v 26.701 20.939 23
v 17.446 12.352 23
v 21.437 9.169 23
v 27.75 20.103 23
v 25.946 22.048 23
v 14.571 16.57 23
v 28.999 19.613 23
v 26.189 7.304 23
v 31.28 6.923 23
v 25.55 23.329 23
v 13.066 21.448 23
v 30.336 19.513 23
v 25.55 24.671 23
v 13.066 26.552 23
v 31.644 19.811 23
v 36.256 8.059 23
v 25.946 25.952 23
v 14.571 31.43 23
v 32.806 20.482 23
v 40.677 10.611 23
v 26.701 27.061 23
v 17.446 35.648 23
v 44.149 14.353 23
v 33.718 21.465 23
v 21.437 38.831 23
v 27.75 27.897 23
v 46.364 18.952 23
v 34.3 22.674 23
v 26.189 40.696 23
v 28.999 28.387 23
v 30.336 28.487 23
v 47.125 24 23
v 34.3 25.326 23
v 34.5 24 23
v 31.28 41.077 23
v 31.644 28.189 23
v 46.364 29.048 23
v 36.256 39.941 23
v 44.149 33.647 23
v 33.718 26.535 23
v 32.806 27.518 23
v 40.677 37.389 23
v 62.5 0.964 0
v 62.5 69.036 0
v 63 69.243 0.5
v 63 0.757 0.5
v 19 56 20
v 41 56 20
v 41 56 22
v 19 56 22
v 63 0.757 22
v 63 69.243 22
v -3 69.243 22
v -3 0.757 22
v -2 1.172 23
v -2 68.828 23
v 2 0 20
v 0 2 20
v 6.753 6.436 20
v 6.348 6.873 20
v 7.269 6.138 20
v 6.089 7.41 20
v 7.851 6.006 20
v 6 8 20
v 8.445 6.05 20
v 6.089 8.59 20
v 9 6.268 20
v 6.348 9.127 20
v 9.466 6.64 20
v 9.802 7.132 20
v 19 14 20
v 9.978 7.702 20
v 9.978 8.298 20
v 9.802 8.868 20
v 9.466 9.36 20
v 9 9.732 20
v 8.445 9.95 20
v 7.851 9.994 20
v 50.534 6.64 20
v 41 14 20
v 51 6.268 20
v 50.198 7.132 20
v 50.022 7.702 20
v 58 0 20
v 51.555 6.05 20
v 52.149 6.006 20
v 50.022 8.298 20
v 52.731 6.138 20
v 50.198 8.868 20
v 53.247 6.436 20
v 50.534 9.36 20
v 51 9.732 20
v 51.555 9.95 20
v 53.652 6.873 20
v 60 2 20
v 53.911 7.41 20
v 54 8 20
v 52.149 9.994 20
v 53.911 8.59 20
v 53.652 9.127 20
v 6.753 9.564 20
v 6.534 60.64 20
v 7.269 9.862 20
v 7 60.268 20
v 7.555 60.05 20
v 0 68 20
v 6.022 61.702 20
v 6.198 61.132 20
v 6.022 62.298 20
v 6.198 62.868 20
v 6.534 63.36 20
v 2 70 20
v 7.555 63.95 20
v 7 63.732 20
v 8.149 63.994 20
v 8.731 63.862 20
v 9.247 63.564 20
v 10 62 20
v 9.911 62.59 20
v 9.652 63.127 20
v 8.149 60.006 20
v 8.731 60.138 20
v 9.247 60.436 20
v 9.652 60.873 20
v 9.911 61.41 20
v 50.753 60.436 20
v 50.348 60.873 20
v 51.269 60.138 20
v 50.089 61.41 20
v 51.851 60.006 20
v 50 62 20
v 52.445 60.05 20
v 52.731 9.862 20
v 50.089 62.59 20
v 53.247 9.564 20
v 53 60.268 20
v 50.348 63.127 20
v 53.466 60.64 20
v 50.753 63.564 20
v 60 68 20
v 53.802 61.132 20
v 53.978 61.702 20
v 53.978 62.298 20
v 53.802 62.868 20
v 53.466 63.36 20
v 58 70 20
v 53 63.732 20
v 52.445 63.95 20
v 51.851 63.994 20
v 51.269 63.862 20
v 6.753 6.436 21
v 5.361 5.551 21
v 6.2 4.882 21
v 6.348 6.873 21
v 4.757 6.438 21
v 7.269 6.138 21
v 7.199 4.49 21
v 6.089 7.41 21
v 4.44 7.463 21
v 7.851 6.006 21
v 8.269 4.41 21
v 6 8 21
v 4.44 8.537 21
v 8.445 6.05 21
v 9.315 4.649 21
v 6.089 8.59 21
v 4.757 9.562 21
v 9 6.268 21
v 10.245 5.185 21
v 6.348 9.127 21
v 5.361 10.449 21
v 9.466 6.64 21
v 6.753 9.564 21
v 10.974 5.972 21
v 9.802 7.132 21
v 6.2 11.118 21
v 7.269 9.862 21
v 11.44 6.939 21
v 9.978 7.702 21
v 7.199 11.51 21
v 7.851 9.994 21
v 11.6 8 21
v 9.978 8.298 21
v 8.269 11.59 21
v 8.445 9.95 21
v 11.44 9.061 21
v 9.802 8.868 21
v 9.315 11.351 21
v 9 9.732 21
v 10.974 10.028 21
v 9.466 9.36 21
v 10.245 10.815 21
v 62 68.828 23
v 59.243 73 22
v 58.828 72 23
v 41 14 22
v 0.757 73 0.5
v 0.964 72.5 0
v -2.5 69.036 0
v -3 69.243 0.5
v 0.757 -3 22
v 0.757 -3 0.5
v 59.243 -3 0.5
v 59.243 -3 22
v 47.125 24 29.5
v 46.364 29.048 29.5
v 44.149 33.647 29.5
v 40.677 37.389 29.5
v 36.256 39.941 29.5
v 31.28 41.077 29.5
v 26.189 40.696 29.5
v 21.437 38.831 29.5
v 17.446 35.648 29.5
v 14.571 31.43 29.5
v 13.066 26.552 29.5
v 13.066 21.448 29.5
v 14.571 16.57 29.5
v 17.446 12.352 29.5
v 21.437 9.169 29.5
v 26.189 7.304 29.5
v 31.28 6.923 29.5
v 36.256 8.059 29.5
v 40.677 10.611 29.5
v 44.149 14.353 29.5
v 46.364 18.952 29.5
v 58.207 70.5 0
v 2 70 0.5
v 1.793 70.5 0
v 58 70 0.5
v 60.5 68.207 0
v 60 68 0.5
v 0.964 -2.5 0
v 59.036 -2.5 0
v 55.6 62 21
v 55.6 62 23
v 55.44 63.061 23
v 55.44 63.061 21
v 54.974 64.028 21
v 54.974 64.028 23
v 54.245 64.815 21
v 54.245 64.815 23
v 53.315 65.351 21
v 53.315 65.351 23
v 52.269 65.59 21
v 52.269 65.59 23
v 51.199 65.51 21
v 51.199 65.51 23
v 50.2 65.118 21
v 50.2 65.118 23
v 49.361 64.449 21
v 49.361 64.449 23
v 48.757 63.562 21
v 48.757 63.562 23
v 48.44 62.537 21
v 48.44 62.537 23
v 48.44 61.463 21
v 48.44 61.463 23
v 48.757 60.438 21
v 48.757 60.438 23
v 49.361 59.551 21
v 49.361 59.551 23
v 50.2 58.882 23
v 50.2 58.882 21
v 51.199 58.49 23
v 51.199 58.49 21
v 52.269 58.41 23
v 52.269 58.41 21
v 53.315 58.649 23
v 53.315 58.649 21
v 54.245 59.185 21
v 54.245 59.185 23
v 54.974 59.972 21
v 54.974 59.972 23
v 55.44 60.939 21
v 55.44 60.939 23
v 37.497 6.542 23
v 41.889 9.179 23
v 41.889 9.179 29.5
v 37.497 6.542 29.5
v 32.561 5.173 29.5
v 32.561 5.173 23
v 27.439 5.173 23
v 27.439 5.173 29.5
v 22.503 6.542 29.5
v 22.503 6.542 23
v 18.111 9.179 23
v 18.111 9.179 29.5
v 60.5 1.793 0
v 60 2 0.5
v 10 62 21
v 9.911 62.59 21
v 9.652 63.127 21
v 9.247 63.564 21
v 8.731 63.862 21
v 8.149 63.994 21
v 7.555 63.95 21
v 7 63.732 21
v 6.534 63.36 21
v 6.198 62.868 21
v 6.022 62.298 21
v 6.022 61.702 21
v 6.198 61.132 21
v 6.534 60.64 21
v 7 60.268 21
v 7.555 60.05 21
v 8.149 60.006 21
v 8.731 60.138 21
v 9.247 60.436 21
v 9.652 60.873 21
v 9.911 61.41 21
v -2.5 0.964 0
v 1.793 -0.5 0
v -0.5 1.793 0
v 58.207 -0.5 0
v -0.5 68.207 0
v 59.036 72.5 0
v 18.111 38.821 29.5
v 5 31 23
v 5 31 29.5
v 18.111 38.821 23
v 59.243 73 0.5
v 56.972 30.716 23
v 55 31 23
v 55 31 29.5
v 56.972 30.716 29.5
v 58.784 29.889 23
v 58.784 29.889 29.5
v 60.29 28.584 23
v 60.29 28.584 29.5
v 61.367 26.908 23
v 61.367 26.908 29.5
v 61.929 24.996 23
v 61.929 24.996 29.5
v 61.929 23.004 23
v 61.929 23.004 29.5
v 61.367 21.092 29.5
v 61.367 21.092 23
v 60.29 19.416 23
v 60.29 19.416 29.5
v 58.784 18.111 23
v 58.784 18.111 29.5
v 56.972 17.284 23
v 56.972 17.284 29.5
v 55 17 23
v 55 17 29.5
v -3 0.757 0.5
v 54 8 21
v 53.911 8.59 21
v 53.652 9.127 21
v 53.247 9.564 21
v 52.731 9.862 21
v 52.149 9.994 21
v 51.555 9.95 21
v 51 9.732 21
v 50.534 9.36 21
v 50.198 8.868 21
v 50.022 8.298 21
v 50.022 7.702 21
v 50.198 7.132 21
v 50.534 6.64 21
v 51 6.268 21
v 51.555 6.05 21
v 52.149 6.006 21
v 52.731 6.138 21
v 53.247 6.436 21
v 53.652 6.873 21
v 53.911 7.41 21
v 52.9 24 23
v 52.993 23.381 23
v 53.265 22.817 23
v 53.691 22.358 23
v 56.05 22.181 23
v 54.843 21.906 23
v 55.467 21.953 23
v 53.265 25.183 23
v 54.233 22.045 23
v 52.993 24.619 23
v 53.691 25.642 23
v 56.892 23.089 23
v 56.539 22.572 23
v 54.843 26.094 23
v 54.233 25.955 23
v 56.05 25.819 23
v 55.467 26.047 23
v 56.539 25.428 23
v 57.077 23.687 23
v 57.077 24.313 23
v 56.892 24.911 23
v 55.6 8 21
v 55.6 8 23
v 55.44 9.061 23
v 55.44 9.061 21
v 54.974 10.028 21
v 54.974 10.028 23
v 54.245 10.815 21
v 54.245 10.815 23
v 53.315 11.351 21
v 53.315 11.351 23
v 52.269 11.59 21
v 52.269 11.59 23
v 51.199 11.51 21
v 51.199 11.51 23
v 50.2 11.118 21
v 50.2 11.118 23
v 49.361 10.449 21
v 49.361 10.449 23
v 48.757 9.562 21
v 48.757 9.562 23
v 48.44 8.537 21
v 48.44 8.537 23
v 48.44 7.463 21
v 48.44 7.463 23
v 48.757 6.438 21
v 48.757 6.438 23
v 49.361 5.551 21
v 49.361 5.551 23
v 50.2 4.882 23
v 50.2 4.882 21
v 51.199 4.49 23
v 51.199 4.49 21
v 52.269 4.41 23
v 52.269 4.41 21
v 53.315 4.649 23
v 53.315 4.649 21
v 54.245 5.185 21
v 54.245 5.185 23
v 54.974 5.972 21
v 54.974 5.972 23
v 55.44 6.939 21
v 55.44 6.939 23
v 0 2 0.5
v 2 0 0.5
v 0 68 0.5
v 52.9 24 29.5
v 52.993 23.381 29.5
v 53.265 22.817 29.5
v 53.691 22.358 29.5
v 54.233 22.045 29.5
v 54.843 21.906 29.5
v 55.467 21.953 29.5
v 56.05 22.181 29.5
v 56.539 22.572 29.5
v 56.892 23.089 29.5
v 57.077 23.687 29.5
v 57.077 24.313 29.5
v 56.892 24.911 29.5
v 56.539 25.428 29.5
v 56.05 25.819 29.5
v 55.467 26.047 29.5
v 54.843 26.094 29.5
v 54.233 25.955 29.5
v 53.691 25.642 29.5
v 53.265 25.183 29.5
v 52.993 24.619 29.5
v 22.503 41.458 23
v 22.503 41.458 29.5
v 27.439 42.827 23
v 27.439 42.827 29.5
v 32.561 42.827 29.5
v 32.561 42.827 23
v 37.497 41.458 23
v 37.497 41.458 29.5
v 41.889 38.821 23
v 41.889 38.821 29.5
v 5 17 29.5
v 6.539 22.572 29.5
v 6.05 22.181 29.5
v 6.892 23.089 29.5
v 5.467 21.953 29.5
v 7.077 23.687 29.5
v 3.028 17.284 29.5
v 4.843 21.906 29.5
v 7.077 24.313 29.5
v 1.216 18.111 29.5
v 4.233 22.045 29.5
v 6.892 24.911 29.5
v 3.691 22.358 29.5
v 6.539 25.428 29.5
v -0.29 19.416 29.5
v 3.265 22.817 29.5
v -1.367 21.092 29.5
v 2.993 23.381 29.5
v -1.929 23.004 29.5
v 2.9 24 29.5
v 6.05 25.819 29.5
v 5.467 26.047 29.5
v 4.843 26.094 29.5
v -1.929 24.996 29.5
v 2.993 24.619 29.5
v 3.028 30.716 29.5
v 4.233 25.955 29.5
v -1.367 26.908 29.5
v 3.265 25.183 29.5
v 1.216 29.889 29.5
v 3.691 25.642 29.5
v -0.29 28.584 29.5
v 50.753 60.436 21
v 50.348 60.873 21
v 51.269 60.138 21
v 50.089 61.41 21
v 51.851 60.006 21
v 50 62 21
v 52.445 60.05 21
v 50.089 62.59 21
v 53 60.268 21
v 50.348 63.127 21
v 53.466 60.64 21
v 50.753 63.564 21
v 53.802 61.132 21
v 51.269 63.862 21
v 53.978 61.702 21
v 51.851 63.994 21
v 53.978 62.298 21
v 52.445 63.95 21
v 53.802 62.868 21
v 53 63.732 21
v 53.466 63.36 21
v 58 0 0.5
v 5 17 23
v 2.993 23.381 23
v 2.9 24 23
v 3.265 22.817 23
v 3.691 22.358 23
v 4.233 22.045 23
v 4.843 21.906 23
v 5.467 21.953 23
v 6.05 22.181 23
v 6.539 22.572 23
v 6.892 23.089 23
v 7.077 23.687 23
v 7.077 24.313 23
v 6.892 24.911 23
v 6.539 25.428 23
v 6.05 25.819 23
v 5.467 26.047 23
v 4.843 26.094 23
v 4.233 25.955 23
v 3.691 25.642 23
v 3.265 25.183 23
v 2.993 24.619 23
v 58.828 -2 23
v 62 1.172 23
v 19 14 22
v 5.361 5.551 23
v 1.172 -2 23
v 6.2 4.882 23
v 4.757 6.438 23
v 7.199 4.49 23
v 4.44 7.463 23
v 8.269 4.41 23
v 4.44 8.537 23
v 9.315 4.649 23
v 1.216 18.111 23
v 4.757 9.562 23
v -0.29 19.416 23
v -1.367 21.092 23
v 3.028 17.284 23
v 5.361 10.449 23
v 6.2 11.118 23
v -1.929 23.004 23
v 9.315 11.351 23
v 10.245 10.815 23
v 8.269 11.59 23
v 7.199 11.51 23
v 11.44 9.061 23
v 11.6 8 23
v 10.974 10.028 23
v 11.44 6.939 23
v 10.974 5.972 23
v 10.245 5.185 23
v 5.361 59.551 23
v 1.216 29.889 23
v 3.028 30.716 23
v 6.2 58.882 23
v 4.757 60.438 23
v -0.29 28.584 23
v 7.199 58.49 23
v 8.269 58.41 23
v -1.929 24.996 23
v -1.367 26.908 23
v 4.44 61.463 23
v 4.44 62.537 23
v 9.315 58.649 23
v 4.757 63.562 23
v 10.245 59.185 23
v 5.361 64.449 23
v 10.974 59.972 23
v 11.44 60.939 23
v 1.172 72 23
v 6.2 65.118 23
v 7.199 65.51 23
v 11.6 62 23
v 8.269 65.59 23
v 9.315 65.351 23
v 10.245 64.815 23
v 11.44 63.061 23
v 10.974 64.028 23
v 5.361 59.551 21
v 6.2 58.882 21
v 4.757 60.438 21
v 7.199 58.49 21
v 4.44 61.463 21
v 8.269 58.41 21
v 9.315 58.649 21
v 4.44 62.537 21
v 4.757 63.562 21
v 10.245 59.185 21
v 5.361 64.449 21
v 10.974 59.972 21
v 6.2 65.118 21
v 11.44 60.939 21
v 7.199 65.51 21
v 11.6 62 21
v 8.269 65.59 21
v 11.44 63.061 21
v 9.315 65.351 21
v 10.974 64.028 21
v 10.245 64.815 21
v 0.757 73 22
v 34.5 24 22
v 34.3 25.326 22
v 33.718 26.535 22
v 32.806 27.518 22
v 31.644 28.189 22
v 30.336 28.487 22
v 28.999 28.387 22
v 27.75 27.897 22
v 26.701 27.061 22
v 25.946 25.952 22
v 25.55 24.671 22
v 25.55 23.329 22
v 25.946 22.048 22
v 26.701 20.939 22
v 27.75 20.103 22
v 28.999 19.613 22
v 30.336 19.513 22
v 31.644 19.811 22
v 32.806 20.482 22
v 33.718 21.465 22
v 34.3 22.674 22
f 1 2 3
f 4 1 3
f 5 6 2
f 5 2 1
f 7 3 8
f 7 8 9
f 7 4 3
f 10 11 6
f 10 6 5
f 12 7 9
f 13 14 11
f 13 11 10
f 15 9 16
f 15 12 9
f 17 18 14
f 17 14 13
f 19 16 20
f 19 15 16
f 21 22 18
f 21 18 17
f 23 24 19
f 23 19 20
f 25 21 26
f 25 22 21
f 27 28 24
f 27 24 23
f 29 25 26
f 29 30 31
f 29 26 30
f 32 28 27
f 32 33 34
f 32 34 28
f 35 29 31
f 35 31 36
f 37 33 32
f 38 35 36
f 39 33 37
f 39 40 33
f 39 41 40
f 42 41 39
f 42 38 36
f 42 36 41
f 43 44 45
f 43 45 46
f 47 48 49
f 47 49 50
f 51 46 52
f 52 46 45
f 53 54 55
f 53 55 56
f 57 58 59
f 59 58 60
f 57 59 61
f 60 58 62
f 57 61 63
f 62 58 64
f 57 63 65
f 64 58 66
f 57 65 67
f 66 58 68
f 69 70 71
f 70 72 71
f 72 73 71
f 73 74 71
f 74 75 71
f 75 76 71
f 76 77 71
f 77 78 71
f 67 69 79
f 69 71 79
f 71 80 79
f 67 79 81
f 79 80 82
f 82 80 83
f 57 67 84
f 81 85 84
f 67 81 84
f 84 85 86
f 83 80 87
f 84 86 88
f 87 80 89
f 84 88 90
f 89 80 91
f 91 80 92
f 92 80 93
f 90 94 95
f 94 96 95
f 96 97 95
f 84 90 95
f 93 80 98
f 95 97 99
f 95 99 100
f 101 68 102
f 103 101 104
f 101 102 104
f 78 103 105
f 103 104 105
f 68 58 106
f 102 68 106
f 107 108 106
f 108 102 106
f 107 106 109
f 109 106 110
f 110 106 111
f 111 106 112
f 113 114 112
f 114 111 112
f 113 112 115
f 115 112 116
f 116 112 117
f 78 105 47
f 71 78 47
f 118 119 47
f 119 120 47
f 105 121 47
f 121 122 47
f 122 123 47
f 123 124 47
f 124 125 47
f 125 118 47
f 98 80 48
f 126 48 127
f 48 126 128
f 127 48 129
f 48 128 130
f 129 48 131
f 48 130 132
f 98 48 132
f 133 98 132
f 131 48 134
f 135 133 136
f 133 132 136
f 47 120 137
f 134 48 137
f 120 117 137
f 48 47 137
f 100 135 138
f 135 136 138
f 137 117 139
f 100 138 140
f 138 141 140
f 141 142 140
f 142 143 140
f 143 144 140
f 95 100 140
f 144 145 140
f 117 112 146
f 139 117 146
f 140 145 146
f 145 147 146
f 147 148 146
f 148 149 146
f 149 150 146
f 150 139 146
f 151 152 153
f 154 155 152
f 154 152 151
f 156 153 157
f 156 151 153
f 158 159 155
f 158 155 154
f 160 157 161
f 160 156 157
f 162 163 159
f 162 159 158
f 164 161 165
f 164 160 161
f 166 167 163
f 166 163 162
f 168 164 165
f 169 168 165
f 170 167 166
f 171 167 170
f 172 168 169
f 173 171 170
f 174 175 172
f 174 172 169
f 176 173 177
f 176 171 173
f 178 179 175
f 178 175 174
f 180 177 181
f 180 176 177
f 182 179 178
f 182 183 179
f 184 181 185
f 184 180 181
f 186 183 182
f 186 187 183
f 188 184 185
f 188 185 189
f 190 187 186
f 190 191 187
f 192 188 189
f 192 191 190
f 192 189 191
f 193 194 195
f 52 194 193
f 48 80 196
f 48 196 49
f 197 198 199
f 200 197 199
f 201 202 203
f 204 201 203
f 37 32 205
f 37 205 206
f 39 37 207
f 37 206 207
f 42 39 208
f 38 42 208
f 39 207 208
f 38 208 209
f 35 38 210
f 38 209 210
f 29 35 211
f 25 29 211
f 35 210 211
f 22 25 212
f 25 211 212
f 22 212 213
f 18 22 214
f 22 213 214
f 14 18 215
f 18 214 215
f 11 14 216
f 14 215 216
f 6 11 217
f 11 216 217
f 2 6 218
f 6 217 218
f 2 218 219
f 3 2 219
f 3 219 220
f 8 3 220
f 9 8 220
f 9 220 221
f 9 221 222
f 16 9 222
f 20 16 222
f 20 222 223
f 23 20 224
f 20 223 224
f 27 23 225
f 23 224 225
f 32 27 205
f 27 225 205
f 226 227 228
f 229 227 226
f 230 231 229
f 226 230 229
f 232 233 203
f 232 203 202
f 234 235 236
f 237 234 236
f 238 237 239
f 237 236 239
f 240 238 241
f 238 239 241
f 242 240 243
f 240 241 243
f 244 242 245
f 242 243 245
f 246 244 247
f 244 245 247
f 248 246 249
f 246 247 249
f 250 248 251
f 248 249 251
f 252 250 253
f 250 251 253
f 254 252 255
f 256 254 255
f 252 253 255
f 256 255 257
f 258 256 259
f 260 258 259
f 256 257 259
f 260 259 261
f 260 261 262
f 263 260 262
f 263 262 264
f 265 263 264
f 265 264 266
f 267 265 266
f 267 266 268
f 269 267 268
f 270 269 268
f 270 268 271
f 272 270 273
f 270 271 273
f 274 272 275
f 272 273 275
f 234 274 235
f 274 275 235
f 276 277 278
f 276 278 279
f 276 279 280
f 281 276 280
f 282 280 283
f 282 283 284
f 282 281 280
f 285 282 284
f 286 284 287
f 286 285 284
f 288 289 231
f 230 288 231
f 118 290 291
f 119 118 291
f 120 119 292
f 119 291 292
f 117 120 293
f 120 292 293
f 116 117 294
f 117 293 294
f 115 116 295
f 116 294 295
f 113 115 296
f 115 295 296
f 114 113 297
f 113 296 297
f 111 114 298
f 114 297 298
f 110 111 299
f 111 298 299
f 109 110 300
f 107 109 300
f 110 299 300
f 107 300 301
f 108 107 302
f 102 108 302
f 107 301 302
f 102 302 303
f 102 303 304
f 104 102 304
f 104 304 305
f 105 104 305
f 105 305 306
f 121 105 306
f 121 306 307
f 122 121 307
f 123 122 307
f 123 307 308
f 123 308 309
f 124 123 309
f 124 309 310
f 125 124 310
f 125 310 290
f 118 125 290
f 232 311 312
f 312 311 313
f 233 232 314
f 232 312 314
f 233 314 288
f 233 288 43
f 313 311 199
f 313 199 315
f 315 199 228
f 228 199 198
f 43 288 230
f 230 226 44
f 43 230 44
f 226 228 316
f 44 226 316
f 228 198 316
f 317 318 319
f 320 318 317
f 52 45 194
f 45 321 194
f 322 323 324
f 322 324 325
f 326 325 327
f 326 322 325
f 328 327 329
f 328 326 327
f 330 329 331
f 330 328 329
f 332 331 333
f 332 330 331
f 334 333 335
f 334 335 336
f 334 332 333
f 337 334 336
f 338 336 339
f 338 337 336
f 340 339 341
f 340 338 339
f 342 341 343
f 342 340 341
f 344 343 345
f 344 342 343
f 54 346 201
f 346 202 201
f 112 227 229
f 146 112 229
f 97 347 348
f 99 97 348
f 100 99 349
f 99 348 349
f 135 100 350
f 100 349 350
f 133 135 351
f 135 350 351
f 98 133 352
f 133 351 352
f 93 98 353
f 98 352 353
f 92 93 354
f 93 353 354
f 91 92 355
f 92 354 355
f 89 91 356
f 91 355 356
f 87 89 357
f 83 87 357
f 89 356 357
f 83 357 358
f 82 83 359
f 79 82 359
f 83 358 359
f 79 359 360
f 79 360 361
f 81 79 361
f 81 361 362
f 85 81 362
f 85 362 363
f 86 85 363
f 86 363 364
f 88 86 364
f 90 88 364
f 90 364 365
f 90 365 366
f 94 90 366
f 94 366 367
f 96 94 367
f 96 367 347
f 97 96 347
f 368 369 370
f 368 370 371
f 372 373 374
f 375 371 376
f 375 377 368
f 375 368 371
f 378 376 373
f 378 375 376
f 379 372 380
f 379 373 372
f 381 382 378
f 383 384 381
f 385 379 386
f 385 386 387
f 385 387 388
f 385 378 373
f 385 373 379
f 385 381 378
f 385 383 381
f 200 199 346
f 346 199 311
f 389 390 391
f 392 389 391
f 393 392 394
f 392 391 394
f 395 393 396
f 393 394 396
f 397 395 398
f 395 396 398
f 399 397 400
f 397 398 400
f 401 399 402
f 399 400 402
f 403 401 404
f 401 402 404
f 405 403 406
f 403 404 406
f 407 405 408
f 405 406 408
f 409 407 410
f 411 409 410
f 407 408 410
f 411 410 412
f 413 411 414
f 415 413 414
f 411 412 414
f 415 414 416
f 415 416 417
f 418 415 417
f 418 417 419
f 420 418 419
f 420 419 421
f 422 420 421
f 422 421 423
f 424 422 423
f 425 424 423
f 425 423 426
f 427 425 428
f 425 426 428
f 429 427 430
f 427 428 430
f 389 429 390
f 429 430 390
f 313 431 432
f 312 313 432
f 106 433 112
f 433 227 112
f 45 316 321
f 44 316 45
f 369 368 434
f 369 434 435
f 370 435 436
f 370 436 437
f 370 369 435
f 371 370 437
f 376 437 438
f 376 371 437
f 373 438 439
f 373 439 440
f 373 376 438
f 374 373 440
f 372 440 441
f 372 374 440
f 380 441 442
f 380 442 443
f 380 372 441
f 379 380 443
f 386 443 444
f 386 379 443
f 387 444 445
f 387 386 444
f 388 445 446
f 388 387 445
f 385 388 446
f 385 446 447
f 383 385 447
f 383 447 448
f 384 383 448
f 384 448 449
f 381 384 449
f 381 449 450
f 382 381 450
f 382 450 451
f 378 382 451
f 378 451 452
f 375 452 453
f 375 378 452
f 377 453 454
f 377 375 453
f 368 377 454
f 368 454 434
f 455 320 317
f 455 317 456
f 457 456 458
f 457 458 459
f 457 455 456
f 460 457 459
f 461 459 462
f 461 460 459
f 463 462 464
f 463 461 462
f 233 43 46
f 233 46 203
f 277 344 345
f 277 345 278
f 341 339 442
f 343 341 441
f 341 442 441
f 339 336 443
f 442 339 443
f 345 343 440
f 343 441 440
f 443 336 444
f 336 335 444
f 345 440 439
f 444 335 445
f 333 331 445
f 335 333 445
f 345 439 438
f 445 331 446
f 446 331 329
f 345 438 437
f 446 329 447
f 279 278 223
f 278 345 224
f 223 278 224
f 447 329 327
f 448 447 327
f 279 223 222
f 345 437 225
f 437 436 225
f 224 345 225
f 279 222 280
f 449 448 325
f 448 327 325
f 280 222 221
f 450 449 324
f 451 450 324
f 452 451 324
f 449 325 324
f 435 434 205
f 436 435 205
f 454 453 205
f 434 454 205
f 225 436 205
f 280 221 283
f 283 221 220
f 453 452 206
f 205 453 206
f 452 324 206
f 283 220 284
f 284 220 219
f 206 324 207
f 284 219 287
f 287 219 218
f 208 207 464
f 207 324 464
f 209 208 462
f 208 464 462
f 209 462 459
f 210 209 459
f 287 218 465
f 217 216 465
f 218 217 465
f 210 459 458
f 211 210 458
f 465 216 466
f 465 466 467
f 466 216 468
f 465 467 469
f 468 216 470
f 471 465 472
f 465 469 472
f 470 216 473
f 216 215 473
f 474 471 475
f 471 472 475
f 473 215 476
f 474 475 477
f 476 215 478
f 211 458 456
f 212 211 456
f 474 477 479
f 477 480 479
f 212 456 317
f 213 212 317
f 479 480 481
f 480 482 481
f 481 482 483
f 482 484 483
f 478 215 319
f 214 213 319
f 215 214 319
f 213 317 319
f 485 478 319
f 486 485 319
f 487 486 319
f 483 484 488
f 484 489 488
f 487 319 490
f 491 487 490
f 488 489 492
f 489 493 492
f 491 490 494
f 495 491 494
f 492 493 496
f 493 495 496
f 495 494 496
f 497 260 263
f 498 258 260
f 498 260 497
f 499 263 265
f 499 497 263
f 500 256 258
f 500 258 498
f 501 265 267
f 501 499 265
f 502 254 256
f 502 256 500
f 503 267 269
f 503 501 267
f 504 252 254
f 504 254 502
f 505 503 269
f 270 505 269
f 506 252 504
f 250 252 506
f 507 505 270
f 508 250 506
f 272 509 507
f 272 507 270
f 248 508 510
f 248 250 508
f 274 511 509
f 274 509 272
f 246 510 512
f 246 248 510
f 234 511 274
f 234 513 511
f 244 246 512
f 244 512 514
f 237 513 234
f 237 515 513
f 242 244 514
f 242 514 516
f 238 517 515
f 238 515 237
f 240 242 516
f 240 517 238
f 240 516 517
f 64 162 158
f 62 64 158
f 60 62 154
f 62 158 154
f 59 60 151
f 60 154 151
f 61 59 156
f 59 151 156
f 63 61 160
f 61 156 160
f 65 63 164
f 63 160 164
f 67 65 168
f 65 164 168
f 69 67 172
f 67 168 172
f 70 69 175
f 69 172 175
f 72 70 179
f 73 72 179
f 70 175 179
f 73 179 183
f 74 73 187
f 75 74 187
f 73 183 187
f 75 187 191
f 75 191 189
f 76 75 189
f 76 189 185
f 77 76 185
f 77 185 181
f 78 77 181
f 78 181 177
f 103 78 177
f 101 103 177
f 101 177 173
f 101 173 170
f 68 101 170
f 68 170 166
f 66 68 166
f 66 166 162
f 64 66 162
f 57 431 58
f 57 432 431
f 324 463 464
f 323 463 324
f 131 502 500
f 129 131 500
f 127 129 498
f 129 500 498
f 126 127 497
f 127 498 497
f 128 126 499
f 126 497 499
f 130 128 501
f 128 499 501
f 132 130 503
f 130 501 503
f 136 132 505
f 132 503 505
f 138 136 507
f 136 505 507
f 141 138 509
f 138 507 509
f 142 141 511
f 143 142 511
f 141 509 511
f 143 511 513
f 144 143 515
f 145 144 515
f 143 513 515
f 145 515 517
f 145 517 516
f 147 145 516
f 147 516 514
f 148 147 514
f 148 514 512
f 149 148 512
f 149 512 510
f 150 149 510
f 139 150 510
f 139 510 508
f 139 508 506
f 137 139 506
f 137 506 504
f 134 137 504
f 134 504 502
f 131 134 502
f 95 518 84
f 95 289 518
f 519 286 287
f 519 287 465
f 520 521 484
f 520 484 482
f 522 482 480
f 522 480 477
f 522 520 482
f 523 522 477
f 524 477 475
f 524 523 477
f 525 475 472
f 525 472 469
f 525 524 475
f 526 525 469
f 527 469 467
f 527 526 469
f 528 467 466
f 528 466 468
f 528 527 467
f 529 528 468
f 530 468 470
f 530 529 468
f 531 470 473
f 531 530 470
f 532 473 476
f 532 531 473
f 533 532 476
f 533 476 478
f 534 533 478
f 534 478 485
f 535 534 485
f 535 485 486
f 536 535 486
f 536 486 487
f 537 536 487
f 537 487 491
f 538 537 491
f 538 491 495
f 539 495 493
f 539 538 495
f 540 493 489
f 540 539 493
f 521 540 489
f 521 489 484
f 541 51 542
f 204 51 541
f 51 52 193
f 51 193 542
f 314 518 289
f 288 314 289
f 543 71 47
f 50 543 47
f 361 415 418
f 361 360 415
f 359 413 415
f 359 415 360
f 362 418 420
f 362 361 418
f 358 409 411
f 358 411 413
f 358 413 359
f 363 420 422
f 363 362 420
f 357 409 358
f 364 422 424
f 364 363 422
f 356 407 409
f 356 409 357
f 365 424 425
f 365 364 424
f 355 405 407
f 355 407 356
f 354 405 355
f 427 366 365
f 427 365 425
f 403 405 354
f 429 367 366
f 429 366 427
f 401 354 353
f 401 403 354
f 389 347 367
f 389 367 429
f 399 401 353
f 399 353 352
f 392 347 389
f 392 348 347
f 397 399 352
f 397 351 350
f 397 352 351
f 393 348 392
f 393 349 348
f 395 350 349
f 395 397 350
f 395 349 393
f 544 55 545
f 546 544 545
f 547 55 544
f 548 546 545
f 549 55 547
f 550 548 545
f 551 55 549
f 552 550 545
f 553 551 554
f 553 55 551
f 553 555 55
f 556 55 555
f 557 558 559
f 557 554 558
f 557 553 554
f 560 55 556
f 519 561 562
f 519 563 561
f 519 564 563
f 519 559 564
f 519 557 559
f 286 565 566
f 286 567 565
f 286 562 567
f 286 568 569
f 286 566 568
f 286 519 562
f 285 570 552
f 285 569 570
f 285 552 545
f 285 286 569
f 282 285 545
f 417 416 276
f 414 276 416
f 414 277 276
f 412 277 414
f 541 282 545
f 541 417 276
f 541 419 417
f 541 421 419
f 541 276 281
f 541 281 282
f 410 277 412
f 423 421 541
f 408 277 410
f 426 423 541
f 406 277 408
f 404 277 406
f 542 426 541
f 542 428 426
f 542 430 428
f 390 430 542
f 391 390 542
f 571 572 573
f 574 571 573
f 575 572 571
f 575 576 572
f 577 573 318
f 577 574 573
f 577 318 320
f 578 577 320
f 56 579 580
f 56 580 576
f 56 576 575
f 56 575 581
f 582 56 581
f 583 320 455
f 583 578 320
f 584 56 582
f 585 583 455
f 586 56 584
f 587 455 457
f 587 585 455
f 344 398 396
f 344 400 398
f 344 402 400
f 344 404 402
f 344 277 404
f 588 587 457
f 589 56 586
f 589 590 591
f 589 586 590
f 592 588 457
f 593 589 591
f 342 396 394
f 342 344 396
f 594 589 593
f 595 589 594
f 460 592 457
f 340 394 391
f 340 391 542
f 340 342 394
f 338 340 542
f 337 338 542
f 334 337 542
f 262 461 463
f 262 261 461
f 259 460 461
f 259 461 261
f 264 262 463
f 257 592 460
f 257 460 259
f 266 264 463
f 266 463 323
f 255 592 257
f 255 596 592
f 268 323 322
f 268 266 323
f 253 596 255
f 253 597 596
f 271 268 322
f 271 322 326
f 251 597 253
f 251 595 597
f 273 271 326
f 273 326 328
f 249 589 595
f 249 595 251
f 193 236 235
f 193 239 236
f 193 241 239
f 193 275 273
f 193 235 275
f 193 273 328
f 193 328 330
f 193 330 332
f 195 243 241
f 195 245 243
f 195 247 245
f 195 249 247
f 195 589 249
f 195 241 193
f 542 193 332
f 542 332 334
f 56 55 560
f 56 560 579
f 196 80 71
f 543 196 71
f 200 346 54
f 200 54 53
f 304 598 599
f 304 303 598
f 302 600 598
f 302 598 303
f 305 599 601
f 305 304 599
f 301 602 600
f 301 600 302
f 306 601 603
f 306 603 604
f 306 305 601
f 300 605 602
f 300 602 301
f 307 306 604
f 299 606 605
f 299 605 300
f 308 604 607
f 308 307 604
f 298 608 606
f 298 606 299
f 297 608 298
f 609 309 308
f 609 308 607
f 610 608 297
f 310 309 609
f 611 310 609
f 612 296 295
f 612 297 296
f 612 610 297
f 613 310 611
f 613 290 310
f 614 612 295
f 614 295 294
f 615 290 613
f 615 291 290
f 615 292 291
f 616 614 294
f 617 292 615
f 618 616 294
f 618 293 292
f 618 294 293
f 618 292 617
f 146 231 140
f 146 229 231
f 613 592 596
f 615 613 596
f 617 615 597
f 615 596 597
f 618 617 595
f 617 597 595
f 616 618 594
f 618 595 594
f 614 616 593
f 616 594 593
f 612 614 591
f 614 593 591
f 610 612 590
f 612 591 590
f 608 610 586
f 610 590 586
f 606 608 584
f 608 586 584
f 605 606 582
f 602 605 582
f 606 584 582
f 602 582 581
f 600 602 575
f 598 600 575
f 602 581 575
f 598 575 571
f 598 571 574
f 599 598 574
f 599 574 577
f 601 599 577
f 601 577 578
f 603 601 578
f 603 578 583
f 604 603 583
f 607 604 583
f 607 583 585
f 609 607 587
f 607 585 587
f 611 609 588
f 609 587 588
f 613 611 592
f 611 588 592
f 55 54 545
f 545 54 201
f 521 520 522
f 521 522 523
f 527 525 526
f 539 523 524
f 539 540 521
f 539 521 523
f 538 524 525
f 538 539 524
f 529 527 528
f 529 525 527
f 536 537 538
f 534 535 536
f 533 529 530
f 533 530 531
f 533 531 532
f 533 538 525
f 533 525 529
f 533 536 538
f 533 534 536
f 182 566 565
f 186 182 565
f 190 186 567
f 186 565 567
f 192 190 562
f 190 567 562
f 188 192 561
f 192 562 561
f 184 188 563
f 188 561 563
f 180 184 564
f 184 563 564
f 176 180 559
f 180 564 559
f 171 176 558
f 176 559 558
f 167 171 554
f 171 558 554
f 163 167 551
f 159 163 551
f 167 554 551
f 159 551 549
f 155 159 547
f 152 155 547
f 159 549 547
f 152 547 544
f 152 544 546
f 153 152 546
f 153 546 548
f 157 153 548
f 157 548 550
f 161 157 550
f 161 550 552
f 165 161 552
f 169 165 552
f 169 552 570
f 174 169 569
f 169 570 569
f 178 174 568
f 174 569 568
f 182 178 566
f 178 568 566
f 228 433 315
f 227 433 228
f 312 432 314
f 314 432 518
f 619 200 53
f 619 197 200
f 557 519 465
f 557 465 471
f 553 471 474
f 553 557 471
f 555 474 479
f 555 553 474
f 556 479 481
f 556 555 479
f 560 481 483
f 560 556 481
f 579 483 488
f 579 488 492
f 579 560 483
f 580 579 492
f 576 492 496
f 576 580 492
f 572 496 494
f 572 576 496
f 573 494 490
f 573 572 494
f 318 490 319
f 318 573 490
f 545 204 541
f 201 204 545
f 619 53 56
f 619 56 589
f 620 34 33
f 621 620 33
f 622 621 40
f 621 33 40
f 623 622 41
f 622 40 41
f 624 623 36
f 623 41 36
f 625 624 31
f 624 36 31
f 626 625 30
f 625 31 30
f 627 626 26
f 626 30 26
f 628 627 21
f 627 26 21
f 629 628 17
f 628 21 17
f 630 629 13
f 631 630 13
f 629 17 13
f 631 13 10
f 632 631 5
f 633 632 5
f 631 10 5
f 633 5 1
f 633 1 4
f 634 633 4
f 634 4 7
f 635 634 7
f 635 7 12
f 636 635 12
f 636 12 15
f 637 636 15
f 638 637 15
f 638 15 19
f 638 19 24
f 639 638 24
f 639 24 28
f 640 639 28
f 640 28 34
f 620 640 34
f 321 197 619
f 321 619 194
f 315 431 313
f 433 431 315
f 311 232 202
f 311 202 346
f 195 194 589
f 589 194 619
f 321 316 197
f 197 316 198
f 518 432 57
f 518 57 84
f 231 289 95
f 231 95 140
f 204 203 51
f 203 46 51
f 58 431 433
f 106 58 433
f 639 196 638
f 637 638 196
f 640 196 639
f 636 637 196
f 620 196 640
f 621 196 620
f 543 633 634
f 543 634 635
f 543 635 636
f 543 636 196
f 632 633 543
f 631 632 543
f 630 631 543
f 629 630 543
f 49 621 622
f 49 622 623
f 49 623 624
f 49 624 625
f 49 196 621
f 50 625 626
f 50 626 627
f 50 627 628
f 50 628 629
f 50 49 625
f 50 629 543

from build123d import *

# Parameters (mm, degrees)
SKIZZE1_W                       = 60
SKIZZE1_H                       = 70
GRUNDK_RPER_DEPTH               = 20
FASE1_SIZE                      = 2
WANDUNG1_T                      = 3
SKIZZE2_R                       = 4.5
DURCHBRUCH_SERVO_DEPTH          = 100.13122616
SKIZZE4_W                       = 22
SKIZZE4_H                       = 42
SERVOFREISCHNITT_DEPTH          = 2
SKIZZE3_R                       = 2.1
FLANSCHAUFSATZ_DEPTH            = 6.5
SKIZZE6_R                       = 17.125
BOHRUNGSCHNECKE_DEPTH           = 6.5
SCHNITT_LINEAR_AUSTRAGEN2_REACH = 101.131
SKIZZE7_R                       = 2
SKIZZE8_R                       = 3.6
SCHNITT_LINEAR_AUSTRAGEN3_DEPTH = 2
FASE2_SIZE                      = 1
FASE3_SIZE                      = 0.5


with BuildPart() as part:
    # Skizze1 → Grundkörper (new body)
    with BuildSketch(Plane.XY):
        with Locations((30, 35)):
            Rectangle(SKIZZE1_W, SKIZZE1_H)
    extrude(amount=GRUNDK_RPER_DEPTH)

    # Fase1
    fase1_edges = [part.edges().sort_by_distance(p)[0] for p in [
        (0, 70, 10),
        (60, 70, 10),
        (60, 0, 10),
        (0, 0, 10),
    ]]
    chamfer(fase1_edges, length=FASE1_SIZE)

    # Wandung1
    wandung1_openings = [part.faces().sort_by_distance(p)[0] for p in [
        (30, 35, 0),
    ]]
    offset(amount=WANDUNG1_T, openings=wandung1_openings, kind=Kind.INTERSECTION)

    # Skizze2 → Durchbruch Servo (cut, through all)
    with BuildSketch(Plane.XY.offset(23)):
        with Locations((30, 24)):
            Circle(SKIZZE2_R)
    extrude(amount=-DURCHBRUCH_SERVO_DEPTH, mode=Mode.SUBTRACT)

    # Skizze4 → ServoFreischnitt (cut)
    with BuildSketch(Plane(origin=(0, 0, 20), x_dir=(-1, 0, 0), z_dir=(0, 0, -1))):
        with Locations((-30, 35)):
            Rectangle(SKIZZE4_W, SKIZZE4_H)
    extrude(amount=-SERVOFREISCHNITT_DEPTH, mode=Mode.SUBTRACT)

    # Skizze3 → FlanschAufsatz (add)
    with BuildSketch(Plane.XY.offset(23)):
        with BuildLine():
            Line((5, 31), (18.11121742, 38.820824834))
            ThreePointArc((18.11121742, 38.820824834), (30, 43), (41.88878258, 38.820824834))
            Line((41.88878258, 38.820824834), (55, 31))
            ThreePointArc((55, 31), (62, 24), (55, 17))
            Line((55, 17), (41.88878258, 9.179175166))
            ThreePointArc((41.88878258, 9.179175166), (30, 5), (18.11121742, 9.179175166))
            Line((18.11121742, 9.179175166), (5, 17))
            ThreePointArc((5, 17), (-2, 24), (5, 31))
        make_face()
        with Locations(Location((5, 24, 0), (0, 0, 180))):
            Circle(SKIZZE3_R, mode=Mode.SUBTRACT)
        with Locations(Location((55, 24, 0), (0, 0, 180))):
            Circle(SKIZZE3_R, mode=Mode.SUBTRACT)
    extrude(amount=FLANSCHAUFSATZ_DEPTH)

    # Skizze6 → BohrungSchnecke (cut)
    with BuildSketch(Plane.XY.offset(29.5)):
        with Locations((30, 24)):
            Circle(SKIZZE6_R)
    extrude(amount=-BOHRUNGSCHNECKE_DEPTH, mode=Mode.SUBTRACT)

    # Skizze7 → Schnitt-Linear austragen2 (cut, up to next)
    with BuildSketch(Plane.XY.offset(23), mode=Mode.PRIVATE) as schnitt_linear_austragen2_sk1:
        with Locations((8, 62)):
            Circle(SKIZZE7_R)
    schnitt_linear_austragen2_tool1 = extrude(schnitt_linear_austragen2_sk1.sketch, amount=-SCHNITT_LINEAR_AUSTRAGEN2_REACH, mode=Mode.PRIVATE) & part.part
    # Skizze7 → Schnitt-Linear austragen2 (cut, up to next)
    with BuildSketch(Plane.XY.offset(23), mode=Mode.PRIVATE) as schnitt_linear_austragen2_sk2:
        with Locations(Location((52, 62, 0), (0, 0, 180))):
            Circle(SKIZZE7_R)
    schnitt_linear_austragen2_tool2 = extrude(schnitt_linear_austragen2_sk2.sketch, amount=-SCHNITT_LINEAR_AUSTRAGEN2_REACH, mode=Mode.PRIVATE) & part.part
    # Skizze7 → Schnitt-Linear austragen2 (cut, up to next)
    with BuildSketch(Plane.XY.offset(23), mode=Mode.PRIVATE) as schnitt_linear_austragen2_sk3:
        with Locations((52, 8)):
            Circle(SKIZZE7_R)
    schnitt_linear_austragen2_tool3 = extrude(schnitt_linear_austragen2_sk3.sketch, amount=-SCHNITT_LINEAR_AUSTRAGEN2_REACH, mode=Mode.PRIVATE) & part.part
    # Skizze7 → Schnitt-Linear austragen2 (cut, up to next)
    with BuildSketch(Plane.XY.offset(23), mode=Mode.PRIVATE) as schnitt_linear_austragen2_sk4:
        with Locations(Location((8, 8, 0), (0, 0, 180))):
            Circle(SKIZZE7_R)
    schnitt_linear_austragen2_tool4 = extrude(schnitt_linear_austragen2_sk4.sketch, amount=-SCHNITT_LINEAR_AUSTRAGEN2_REACH, mode=Mode.PRIVATE) & part.part
    add(schnitt_linear_austragen2_tool1.solids().sort_by_distance((8, 62, 23))[0], mode=Mode.SUBTRACT)
    add(schnitt_linear_austragen2_tool2.solids().sort_by_distance((52, 62, 23))[0], mode=Mode.SUBTRACT)
    add(schnitt_linear_austragen2_tool3.solids().sort_by_distance((52, 8, 23))[0], mode=Mode.SUBTRACT)
    add(schnitt_linear_austragen2_tool4.solids().sort_by_distance((8, 8, 23))[0], mode=Mode.SUBTRACT)

    # Skizze8 → Schnitt-Linear austragen3 (cut)
    with BuildSketch(Plane.XY.offset(23)):
        with Locations((8, 62)):
            Circle(SKIZZE8_R)
        with Locations((52, 62)):
            Circle(SKIZZE8_R)
        with Locations((52, 8)):
            Circle(SKIZZE8_R)
        with Locations((8, 8)):
            Circle(SKIZZE8_R)
    extrude(amount=-SCHNITT_LINEAR_AUSTRAGEN3_DEPTH, mode=Mode.SUBTRACT)

    # Fase2
    fase2_edges = [part.edges().sort_by_distance(p)[0] for p in [
        (63, 35, 23),
        (30, -3, 23),
        (-3, 35, 23),
        (30, 73, 23),
        (61.121320344, 71.121320344, 23),
        (-1.121320344, 71.121320344, 23),
        (-1.121320344, -1.121320344, 23),
        (61.121320344, -1.121320344, 23),
    ]]
    chamfer(fase2_edges, length=FASE2_SIZE - 0.0001)  # a hair under: the kernel refuses the full size

    # Fase3
    fase3_edges = [part.edges().sort_by_distance(p)[0] for p in [
        (63, 35, 0),
        (-3, 35, 0),
        (30, 73, 0),
        (30, -3, 0),
        (61.121320344, 71.121320344, 0),
        (-1.121320344, 71.121320344, 0),
        (-1.121320344, -1.121320344, 0),
        (61.121320344, -1.121320344, 0),
        (0, 35, 0),
        (30, 0, 0),
        (60, 35, 0),
        (30, 70, 0),
        (59, 1, 0),
        (1, 1, 0),
        (1, 69, 0),
        (59, 69, 0),
    ]]
    chamfer(fase3_edges, length=FASE3_SIZE)


solid = part.part
